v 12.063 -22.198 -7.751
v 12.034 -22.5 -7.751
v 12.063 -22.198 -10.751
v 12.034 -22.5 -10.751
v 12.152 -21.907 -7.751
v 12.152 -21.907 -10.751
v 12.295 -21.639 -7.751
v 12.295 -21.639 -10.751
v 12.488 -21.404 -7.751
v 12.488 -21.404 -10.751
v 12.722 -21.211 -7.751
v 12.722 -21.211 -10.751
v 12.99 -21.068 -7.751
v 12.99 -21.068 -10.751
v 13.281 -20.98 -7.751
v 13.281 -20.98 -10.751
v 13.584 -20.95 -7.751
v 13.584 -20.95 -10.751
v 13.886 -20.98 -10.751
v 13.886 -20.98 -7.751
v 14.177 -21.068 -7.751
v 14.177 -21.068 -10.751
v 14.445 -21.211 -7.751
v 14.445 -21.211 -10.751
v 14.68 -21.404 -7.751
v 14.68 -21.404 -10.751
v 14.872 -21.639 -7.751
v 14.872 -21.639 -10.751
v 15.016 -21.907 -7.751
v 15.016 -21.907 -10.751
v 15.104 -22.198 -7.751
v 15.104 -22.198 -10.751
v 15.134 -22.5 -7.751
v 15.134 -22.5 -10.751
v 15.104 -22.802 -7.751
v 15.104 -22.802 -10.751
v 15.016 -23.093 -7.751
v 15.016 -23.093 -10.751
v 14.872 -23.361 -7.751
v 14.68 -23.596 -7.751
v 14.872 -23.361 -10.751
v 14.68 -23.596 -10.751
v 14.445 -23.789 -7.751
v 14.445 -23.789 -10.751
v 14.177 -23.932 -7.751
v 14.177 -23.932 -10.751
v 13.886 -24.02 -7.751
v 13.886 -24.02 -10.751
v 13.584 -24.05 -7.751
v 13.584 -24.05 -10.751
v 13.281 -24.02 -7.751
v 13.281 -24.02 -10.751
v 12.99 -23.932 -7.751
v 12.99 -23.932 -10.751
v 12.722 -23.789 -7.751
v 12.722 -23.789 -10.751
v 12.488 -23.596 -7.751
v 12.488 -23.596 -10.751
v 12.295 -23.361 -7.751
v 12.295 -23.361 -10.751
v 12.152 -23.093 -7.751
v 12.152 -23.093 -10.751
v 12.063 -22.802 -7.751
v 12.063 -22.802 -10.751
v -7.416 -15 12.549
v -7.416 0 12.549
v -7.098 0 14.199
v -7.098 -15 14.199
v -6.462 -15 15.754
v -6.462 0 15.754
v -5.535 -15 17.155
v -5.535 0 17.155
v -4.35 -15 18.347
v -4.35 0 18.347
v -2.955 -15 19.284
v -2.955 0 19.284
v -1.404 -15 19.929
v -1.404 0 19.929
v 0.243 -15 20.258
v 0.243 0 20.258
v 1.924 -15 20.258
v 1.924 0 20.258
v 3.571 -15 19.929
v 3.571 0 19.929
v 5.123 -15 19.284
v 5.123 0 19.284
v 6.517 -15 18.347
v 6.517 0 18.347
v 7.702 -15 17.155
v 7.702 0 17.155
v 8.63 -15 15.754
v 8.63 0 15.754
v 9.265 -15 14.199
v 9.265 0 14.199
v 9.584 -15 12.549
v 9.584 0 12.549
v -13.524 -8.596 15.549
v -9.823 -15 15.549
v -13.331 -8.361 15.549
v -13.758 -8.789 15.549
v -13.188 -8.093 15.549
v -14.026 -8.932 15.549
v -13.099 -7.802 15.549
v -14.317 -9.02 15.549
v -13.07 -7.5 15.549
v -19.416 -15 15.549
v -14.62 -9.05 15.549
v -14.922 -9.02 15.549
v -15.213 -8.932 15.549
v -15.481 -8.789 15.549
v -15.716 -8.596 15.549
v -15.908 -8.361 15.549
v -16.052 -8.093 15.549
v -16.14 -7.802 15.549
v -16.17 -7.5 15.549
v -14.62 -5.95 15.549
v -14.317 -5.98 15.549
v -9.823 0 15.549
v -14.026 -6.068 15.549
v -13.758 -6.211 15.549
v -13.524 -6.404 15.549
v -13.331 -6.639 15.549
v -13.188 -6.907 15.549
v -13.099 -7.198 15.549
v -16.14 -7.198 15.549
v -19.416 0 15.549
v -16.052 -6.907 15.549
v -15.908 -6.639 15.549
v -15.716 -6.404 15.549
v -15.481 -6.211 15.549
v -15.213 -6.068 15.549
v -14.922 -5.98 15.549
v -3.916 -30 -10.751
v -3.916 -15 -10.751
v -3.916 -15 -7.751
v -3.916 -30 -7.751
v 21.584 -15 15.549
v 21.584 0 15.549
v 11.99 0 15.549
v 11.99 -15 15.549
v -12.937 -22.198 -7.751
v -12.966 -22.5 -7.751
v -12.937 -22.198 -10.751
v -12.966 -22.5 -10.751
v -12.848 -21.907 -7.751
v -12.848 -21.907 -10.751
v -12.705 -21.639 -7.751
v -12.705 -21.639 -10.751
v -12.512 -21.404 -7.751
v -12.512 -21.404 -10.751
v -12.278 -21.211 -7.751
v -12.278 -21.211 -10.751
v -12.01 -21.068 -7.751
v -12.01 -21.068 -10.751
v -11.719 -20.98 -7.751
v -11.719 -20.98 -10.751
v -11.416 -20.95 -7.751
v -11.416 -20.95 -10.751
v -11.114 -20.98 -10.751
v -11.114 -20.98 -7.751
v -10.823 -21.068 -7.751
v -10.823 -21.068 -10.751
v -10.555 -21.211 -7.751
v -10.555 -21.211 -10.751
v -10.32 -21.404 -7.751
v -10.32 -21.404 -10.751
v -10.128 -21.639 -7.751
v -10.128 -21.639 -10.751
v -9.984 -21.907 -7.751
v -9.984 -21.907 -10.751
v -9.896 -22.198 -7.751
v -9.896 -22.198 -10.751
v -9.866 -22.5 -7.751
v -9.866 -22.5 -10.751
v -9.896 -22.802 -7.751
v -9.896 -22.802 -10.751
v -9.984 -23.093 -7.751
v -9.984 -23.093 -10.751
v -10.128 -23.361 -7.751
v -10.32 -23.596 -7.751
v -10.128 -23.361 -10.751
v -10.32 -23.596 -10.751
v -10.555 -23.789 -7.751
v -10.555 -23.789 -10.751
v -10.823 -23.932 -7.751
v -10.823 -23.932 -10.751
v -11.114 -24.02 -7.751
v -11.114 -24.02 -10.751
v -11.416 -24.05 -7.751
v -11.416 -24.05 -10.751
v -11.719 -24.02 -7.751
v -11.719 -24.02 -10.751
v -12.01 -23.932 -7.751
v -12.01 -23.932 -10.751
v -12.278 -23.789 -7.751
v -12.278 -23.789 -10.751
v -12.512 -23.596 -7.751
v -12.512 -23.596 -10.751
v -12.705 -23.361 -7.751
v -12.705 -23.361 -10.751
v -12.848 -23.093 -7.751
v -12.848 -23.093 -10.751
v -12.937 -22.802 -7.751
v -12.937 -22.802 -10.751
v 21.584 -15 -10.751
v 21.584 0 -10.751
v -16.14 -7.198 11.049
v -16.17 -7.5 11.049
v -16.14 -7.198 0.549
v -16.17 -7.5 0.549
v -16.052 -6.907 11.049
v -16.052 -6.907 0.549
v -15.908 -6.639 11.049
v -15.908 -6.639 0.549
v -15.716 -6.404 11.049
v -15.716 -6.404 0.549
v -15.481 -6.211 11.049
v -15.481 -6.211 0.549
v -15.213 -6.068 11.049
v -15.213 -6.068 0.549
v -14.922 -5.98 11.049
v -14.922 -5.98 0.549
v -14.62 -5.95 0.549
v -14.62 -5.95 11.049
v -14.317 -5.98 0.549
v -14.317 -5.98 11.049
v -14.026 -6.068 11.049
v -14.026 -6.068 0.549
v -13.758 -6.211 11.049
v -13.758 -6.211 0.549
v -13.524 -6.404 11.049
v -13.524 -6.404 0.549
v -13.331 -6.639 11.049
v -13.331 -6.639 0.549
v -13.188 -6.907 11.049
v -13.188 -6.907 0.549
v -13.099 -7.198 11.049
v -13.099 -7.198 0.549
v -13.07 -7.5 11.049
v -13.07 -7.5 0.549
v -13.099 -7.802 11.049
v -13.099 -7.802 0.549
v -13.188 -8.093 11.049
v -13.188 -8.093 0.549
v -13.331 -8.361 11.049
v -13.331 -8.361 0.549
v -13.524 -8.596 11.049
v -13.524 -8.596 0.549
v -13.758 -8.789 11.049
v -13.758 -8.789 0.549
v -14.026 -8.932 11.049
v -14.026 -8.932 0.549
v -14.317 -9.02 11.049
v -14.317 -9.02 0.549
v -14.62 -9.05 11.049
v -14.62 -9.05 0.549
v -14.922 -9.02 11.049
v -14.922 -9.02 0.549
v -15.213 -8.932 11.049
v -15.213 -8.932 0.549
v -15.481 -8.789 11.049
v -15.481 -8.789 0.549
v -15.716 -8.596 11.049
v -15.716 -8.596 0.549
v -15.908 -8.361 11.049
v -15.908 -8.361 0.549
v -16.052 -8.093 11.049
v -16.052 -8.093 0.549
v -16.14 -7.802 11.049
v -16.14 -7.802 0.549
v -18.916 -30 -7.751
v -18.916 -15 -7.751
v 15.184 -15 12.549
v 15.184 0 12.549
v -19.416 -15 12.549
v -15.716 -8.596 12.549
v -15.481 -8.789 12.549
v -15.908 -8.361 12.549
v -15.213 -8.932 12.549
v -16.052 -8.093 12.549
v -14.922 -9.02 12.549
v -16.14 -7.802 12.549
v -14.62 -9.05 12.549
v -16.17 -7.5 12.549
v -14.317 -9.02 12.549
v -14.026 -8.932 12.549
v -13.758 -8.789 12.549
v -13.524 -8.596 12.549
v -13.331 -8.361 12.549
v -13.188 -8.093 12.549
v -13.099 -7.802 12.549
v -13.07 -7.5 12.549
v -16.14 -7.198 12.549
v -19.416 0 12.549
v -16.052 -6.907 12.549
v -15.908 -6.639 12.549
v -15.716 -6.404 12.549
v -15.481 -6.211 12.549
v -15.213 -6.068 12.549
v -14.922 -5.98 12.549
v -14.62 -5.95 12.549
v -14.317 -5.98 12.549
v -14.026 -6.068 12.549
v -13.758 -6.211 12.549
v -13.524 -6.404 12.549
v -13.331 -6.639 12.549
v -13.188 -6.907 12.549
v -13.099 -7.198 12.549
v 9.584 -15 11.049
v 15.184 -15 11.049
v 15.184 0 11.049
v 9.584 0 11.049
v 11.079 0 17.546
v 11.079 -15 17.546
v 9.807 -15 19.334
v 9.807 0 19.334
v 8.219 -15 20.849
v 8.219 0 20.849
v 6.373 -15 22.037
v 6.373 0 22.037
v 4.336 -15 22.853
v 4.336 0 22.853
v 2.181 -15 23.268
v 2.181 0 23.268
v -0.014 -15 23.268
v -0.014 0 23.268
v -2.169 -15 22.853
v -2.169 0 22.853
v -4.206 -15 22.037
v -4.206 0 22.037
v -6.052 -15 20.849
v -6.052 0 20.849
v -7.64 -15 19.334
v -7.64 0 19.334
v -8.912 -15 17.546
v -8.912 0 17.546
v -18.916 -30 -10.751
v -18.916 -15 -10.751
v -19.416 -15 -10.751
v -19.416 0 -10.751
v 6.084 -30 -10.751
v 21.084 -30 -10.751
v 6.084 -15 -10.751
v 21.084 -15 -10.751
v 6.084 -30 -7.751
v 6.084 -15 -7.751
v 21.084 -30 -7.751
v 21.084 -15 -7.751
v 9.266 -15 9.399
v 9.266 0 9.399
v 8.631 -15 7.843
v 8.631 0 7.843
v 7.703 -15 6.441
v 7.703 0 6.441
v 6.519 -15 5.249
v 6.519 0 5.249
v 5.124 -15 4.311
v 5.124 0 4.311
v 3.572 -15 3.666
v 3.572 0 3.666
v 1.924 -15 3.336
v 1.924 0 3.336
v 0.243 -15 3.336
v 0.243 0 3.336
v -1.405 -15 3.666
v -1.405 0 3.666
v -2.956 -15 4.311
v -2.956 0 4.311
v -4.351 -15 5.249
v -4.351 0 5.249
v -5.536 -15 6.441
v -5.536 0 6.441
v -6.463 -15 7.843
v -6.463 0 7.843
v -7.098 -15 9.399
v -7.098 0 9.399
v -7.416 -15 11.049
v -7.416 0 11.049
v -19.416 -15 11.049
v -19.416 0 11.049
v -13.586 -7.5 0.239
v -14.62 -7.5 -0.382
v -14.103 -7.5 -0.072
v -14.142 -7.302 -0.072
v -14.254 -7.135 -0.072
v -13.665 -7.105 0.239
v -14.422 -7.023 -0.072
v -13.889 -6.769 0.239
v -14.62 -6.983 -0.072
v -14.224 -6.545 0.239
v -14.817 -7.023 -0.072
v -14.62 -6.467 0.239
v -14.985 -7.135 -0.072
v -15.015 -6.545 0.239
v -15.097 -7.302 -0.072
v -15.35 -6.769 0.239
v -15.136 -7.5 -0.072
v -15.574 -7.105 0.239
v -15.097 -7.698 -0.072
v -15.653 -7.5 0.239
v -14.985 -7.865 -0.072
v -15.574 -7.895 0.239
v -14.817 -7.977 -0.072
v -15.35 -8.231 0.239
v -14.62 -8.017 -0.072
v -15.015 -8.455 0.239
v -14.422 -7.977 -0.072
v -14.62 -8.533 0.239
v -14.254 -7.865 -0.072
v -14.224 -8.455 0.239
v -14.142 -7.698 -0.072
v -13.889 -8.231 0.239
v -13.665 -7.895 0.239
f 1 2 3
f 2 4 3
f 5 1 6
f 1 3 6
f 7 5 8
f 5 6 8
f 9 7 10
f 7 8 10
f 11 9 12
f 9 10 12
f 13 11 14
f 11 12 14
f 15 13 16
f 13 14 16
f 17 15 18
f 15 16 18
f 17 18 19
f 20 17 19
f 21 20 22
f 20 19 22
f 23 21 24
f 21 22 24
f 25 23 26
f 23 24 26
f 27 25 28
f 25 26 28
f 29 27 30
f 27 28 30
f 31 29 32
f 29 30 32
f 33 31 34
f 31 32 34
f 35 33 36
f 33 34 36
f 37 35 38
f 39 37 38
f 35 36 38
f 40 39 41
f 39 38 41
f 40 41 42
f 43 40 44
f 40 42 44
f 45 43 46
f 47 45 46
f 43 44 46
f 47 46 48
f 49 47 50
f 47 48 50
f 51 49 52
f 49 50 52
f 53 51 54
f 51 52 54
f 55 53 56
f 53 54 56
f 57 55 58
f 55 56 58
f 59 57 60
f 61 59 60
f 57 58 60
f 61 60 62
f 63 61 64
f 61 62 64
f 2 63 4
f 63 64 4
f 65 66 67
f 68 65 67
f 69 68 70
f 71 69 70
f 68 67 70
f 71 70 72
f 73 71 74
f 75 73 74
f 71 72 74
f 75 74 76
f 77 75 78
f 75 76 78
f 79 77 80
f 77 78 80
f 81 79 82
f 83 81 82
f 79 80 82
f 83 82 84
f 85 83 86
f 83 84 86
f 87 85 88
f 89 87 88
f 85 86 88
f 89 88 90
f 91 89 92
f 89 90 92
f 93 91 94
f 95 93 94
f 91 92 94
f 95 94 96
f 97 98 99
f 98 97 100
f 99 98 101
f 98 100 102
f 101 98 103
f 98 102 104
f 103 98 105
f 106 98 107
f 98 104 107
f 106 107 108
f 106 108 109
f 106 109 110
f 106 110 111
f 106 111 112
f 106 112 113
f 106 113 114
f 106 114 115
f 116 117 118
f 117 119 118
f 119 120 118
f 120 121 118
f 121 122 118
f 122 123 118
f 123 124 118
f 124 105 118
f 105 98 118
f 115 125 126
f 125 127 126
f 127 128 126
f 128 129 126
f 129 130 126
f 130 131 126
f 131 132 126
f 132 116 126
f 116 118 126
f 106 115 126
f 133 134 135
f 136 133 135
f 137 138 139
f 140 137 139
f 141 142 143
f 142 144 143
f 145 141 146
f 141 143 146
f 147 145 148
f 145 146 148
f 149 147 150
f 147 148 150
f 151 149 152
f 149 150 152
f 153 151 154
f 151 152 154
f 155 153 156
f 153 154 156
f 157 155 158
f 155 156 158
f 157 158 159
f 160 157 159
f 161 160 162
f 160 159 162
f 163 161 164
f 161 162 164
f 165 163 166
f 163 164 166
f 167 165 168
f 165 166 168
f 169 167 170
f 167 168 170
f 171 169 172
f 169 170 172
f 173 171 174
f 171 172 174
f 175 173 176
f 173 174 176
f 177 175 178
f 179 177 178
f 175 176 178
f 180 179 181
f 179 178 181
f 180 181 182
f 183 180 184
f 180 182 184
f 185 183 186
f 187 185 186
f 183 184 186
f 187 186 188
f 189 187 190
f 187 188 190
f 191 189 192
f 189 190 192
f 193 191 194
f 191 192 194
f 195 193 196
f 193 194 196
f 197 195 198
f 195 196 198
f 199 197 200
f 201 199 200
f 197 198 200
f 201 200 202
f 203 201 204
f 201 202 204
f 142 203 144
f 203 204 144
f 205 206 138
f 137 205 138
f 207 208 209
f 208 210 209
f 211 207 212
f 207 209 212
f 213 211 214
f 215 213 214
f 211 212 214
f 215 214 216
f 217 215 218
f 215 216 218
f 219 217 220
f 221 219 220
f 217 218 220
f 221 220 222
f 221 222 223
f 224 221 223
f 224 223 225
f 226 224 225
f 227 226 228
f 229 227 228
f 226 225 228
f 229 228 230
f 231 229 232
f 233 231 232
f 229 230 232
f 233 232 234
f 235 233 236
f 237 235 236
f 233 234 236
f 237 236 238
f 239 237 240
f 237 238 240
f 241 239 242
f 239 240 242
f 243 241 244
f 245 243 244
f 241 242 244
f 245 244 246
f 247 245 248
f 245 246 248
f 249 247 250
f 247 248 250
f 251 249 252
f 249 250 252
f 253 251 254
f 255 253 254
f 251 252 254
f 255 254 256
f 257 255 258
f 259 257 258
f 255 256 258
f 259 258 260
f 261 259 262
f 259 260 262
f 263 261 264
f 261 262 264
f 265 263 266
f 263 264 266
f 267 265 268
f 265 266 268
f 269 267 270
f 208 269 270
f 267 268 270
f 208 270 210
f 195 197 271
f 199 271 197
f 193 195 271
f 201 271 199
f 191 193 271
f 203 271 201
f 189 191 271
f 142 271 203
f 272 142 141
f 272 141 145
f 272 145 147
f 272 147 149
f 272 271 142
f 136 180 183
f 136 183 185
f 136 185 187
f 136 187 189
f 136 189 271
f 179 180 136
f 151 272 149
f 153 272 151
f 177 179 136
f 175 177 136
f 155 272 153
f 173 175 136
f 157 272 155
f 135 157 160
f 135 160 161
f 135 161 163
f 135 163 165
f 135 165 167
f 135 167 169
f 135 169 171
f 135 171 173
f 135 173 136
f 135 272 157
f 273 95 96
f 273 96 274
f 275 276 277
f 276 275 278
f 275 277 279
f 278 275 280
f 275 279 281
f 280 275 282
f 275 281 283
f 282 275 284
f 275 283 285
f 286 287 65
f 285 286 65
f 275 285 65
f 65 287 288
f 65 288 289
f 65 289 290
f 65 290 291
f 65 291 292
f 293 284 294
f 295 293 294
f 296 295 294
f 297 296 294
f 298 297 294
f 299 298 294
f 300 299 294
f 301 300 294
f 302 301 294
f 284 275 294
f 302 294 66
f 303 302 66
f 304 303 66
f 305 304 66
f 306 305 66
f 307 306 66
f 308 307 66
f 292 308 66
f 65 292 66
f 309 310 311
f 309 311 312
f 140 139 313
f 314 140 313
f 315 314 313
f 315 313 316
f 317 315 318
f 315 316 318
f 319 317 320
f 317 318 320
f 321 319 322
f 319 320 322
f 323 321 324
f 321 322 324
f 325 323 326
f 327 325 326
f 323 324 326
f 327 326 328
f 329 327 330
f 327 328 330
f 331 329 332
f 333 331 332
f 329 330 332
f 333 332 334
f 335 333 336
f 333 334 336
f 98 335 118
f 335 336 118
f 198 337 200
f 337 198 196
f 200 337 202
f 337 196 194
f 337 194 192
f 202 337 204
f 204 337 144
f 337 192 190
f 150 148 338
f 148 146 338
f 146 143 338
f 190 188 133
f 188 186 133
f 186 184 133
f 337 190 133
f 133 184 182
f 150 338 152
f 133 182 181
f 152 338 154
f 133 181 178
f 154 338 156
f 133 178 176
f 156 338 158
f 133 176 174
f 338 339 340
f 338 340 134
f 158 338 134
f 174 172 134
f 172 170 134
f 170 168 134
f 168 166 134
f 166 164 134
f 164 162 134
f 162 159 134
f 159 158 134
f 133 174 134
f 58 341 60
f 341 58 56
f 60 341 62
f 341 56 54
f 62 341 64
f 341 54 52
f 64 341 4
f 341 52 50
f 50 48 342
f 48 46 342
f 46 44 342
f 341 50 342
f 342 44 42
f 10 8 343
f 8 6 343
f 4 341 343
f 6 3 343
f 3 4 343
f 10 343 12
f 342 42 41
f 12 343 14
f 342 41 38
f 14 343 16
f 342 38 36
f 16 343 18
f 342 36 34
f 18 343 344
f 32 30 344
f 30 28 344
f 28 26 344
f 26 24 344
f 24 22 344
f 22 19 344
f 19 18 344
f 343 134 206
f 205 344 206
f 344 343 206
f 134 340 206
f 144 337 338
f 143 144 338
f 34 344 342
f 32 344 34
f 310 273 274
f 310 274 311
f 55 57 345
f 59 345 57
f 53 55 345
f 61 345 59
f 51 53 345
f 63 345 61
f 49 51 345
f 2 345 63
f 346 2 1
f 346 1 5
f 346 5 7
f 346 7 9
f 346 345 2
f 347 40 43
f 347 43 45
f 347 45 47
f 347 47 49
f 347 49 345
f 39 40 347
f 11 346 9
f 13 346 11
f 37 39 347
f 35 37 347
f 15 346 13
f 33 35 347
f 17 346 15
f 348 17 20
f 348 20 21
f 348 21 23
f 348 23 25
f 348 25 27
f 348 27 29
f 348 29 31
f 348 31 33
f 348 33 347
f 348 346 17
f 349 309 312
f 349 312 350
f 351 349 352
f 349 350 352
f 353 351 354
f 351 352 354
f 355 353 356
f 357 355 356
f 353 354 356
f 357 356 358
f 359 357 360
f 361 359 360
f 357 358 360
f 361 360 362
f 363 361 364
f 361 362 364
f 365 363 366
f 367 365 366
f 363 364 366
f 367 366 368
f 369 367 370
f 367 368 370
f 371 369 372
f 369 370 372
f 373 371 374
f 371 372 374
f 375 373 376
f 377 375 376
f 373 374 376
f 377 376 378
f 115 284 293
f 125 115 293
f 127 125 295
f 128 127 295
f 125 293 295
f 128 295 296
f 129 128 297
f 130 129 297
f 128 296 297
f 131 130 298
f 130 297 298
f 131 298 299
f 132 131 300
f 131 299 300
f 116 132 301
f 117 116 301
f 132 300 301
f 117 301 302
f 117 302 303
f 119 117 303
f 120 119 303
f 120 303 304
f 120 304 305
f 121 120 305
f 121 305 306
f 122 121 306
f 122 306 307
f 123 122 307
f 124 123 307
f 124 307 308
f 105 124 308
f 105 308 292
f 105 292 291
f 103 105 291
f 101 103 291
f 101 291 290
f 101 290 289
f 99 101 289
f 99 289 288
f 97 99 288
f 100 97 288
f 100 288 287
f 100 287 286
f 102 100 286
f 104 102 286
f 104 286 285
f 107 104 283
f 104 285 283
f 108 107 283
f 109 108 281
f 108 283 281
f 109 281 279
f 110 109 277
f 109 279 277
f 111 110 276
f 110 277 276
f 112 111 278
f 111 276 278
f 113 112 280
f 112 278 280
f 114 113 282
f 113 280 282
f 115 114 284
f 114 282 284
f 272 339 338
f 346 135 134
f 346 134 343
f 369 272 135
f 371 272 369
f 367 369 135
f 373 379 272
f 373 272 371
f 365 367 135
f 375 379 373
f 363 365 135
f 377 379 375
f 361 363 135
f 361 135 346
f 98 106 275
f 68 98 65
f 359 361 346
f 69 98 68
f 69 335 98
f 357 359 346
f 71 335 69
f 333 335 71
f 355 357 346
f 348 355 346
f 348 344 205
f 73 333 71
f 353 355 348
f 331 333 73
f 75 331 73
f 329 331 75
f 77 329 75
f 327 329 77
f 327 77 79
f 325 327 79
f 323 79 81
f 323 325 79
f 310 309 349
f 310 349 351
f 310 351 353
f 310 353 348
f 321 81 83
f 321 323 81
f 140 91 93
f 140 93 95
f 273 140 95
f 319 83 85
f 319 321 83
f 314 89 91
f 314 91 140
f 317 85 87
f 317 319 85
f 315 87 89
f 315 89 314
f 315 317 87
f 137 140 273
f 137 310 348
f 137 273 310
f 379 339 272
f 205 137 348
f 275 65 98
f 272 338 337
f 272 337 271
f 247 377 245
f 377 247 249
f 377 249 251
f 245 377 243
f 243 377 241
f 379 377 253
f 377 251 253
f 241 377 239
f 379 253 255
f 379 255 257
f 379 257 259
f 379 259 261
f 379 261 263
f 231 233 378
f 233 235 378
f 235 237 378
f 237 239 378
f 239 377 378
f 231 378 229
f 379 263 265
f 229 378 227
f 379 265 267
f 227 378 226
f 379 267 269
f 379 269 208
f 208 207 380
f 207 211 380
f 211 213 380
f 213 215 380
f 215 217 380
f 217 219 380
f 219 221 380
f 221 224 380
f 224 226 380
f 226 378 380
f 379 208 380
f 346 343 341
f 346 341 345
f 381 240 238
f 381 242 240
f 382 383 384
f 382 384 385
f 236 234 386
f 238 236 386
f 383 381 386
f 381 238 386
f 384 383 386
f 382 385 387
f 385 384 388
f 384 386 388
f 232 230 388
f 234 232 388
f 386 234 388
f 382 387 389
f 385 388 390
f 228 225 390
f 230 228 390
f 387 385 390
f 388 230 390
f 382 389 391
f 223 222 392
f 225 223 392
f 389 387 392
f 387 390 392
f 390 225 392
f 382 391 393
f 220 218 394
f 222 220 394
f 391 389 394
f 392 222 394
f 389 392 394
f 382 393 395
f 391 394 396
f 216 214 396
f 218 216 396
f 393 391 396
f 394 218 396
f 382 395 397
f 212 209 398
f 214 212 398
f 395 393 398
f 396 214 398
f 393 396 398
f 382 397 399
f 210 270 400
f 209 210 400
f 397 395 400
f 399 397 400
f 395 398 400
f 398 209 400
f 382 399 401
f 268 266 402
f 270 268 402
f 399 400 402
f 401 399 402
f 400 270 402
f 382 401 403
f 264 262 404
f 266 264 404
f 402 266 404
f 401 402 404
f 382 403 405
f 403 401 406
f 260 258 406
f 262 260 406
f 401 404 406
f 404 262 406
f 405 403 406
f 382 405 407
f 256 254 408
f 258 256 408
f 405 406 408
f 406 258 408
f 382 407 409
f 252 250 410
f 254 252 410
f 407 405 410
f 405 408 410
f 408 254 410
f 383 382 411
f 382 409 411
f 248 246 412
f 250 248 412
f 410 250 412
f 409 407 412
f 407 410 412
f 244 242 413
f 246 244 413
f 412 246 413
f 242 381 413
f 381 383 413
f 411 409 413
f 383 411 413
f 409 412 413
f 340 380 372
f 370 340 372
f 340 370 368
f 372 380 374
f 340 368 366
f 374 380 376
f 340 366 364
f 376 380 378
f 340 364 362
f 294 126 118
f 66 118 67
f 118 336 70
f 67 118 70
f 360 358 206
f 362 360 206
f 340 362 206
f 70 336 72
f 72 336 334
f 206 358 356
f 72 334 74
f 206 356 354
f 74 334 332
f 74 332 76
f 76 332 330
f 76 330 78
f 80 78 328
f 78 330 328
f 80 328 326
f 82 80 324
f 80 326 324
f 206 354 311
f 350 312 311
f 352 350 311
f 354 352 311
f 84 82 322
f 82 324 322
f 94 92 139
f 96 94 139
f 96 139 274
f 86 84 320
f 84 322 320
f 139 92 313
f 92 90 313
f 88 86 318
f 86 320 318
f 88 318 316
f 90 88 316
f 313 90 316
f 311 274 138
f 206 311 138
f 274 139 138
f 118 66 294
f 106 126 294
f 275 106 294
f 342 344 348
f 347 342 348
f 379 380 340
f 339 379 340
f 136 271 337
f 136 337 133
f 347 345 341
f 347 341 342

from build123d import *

# Parameters (mm, degrees)
F1_DEPTH       = 15
F3_D           = 3.1
F3_DEPTH       = 15
F3_TIP         = 0.9313339595
F4_W           = 15
F4_H           = 3
F5_DEPTH       = 15
F8_D           = 3.1
F8_DEPTH       = 3
F8_TIP         = 0.9313339595
F8_ON_F7_D     = 3.1
F8_ON_F7_DEPTH = 3
F8_ON_F7_TIP   = 0.9313339595


with BuildPart() as f1:
    # F0 (on Front) → F1 (new body)
    with BuildSketch(Plane.XZ):
        with BuildLine():
            Line((-7.4164065372, 11.0490259535), (-19.4164065372, 11.0490259535))
            Line((-19.4164065372, 11.0490259535), (-19.4164065372, 8.0490259535))
            Line((-19.4164065372, 8.0490259535), (-19.4164065372, -10.7509740465))
            Line((-19.4164065372, -10.7509740465), (21.5835934628, -10.7509740465))
            Line((21.5835934628, -10.7509740465), (21.5835934628, 8.0490259535))
            Line((21.5835934628, 8.0490259535), (21.5835934628, 15.5490259535))
            Line((21.5835934628, 15.5490259535), (11.9898709467, 15.5490259535))
            ThreePointArc((11.9898709467, 15.5490259535), (1.0835934628, 23.3204583115), (-9.8226840211, 15.5490259535))
            Line((-9.8226840211, 15.5490259535), (-19.4164065372, 15.5490259535))
            Line((-19.4164065372, 15.5490259535), (-19.4164065372, 12.5490259535))
            Line((-19.4164065372, 12.5490259535), (-7.4164065372, 12.5490259535))
            ThreePointArc((-7.4164065372, 12.5490259535), (1.0835934628, 20.29968098), (9.5835934628, 12.5490259535))
            Line((9.5835934628, 12.5490259535), (15.1835934628, 12.5490259535))
            Line((15.1835934628, 12.5490259535), (15.1835934628, 11.0490259535))
            Line((15.1835934628, 11.0490259535), (12.5835934628, 11.0490259535))
            Line((12.5835934628, 11.0490259535), (9.5835934628, 11.0490259535))
            ThreePointArc((9.5835934628, 11.0490259535), (1.0835934628, 3.294835898), (-7.4164065372, 11.0490259535))
        make_face()
    extrude(amount=F1_DEPTH)

    # F3
    with Locations(Plane.XY.offset(15.5490259535)):
        with Locations((-14.6195452792, -7.5)):
            Hole(F3_D / 2, depth=F3_DEPTH)
            with Locations((0, 0, -(F3_DEPTH + F3_TIP / 2))):  # 118° drill point
                Cone(0, F3_D / 2, F3_TIP, mode=Mode.SUBTRACT)

    # F4 (on face) → F5 (join)
    with BuildSketch(Plane.XZ.offset(15)):
        with Locations((13.5835934628, -9.2509740465)):
            Rectangle(F4_W, F4_H)
        with Locations((-11.4164065372, -9.2509740465)):
            Rectangle(F4_W, F4_H)
    extrude(amount=F5_DEPTH)

    # F8
    with Locations(Plane.XY.offset(-7.7509740465)):
        with Locations((-11.4164065372, -22.5)):
            Hole(F8_D / 2, depth=F8_DEPTH)
            with Locations((0, 0, -(F8_DEPTH + F8_TIP / 2))):  # 118° drill point
                Cone(0, F8_D / 2, F8_TIP, mode=Mode.SUBTRACT)

    # F8 on F7
    with Locations(Plane.XY.offset(-7.7509740465)):
        with Locations((13.5835934628, -22.5)):
            Hole(F8_ON_F7_D / 2, depth=F8_ON_F7_DEPTH)
            with Locations((0, 0, -(F8_ON_F7_DEPTH + F8_ON_F7_TIP / 2))):  # 118° drill point
                Cone(0, F8_ON_F7_D / 2, F8_ON_F7_TIP, mode=Mode.SUBTRACT)


solid = f1.part
